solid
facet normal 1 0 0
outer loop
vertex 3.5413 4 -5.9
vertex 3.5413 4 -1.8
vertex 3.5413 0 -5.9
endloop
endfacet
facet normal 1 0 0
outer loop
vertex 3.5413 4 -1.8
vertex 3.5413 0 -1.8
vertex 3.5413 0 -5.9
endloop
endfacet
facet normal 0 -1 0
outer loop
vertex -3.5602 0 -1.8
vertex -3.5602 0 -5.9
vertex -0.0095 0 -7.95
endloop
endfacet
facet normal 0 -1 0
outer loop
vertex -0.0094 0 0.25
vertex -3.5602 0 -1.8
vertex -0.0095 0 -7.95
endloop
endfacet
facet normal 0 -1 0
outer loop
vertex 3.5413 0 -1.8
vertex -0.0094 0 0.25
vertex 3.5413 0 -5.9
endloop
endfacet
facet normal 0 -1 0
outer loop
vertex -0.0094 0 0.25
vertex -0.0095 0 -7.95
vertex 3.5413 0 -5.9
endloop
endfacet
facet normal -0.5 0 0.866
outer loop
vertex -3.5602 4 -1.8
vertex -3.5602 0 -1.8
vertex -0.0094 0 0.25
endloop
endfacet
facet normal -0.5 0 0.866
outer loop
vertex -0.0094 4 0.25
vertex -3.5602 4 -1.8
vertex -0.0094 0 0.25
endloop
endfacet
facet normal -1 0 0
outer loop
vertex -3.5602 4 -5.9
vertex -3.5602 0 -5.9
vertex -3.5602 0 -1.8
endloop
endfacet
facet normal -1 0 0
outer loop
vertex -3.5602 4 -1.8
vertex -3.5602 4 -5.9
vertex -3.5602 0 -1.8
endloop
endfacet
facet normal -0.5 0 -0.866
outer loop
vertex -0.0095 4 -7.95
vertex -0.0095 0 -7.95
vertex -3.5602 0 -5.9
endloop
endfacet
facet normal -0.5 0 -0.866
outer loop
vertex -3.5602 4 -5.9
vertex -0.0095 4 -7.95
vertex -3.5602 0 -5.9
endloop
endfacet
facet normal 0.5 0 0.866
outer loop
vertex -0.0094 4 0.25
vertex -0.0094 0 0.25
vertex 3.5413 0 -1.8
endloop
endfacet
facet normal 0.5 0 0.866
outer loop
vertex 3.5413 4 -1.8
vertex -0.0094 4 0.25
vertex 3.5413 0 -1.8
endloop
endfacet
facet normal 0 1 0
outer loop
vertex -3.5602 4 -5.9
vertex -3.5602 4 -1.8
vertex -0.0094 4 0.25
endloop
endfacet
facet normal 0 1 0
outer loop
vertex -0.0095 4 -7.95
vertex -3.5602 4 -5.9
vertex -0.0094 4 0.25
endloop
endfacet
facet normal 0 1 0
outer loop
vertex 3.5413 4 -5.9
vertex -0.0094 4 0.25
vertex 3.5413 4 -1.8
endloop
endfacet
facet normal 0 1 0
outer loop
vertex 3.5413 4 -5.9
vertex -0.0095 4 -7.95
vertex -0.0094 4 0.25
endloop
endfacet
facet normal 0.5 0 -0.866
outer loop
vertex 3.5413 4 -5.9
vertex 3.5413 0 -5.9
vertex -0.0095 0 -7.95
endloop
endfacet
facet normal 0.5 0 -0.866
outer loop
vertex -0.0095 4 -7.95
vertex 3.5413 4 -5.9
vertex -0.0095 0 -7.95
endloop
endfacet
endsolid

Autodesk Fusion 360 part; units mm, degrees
sketch "Skizze1" plane through (0, 0, 0) normal (0, 1, 0) x (1, 0, 0)
  line L0 (0, 7.7) -> (0, 0)
  line L1 (0, 7.7) -> (0.0094, 3.85)
  line L2 (0, 7.7) -> (0, 0)
  line L3 (-0.0094, -0.25) -> (3.5413, 1.8)
  line L4 (3.5413, 1.8) -> (3.5413, 5.9)
  line L5 (3.5413, 5.9) -> (-0.0095, 7.95)
  line L6 (-0.0095, 7.95) -> (-3.5602, 5.9)
  line L7 (-3.5602, 5.9) -> (-3.5602, 1.8)
  line L8 (-3.5602, 1.8) -> (-0.0094, -0.25)
  point P0 (0.0094, 3.85)
  point P1 (-0.0094, 3.85)
  dimension "d1" = 7.7
  dimension "d3" = 3.85
  dimension "d4" = 7.7
  dimension "d5" = 4.1
  dimension "d6" = 4.1
  dimension "d7" = 4.1
  dimension "d8" = 4.1
  dimension "d9" = 4.1
  dimension "d10" = 4.1
extrude "Extrusion1" add sketch "Skizze1" along normal blind 4 makes body 1
copy_body "Körper->Berechn1" bodies 1 removing the originals makes body 2 in component "Component"
component "Component" placed x (1, 0, 0) y (0, 1, 0) z (0, 0, 1) at (0, 0, 0)
